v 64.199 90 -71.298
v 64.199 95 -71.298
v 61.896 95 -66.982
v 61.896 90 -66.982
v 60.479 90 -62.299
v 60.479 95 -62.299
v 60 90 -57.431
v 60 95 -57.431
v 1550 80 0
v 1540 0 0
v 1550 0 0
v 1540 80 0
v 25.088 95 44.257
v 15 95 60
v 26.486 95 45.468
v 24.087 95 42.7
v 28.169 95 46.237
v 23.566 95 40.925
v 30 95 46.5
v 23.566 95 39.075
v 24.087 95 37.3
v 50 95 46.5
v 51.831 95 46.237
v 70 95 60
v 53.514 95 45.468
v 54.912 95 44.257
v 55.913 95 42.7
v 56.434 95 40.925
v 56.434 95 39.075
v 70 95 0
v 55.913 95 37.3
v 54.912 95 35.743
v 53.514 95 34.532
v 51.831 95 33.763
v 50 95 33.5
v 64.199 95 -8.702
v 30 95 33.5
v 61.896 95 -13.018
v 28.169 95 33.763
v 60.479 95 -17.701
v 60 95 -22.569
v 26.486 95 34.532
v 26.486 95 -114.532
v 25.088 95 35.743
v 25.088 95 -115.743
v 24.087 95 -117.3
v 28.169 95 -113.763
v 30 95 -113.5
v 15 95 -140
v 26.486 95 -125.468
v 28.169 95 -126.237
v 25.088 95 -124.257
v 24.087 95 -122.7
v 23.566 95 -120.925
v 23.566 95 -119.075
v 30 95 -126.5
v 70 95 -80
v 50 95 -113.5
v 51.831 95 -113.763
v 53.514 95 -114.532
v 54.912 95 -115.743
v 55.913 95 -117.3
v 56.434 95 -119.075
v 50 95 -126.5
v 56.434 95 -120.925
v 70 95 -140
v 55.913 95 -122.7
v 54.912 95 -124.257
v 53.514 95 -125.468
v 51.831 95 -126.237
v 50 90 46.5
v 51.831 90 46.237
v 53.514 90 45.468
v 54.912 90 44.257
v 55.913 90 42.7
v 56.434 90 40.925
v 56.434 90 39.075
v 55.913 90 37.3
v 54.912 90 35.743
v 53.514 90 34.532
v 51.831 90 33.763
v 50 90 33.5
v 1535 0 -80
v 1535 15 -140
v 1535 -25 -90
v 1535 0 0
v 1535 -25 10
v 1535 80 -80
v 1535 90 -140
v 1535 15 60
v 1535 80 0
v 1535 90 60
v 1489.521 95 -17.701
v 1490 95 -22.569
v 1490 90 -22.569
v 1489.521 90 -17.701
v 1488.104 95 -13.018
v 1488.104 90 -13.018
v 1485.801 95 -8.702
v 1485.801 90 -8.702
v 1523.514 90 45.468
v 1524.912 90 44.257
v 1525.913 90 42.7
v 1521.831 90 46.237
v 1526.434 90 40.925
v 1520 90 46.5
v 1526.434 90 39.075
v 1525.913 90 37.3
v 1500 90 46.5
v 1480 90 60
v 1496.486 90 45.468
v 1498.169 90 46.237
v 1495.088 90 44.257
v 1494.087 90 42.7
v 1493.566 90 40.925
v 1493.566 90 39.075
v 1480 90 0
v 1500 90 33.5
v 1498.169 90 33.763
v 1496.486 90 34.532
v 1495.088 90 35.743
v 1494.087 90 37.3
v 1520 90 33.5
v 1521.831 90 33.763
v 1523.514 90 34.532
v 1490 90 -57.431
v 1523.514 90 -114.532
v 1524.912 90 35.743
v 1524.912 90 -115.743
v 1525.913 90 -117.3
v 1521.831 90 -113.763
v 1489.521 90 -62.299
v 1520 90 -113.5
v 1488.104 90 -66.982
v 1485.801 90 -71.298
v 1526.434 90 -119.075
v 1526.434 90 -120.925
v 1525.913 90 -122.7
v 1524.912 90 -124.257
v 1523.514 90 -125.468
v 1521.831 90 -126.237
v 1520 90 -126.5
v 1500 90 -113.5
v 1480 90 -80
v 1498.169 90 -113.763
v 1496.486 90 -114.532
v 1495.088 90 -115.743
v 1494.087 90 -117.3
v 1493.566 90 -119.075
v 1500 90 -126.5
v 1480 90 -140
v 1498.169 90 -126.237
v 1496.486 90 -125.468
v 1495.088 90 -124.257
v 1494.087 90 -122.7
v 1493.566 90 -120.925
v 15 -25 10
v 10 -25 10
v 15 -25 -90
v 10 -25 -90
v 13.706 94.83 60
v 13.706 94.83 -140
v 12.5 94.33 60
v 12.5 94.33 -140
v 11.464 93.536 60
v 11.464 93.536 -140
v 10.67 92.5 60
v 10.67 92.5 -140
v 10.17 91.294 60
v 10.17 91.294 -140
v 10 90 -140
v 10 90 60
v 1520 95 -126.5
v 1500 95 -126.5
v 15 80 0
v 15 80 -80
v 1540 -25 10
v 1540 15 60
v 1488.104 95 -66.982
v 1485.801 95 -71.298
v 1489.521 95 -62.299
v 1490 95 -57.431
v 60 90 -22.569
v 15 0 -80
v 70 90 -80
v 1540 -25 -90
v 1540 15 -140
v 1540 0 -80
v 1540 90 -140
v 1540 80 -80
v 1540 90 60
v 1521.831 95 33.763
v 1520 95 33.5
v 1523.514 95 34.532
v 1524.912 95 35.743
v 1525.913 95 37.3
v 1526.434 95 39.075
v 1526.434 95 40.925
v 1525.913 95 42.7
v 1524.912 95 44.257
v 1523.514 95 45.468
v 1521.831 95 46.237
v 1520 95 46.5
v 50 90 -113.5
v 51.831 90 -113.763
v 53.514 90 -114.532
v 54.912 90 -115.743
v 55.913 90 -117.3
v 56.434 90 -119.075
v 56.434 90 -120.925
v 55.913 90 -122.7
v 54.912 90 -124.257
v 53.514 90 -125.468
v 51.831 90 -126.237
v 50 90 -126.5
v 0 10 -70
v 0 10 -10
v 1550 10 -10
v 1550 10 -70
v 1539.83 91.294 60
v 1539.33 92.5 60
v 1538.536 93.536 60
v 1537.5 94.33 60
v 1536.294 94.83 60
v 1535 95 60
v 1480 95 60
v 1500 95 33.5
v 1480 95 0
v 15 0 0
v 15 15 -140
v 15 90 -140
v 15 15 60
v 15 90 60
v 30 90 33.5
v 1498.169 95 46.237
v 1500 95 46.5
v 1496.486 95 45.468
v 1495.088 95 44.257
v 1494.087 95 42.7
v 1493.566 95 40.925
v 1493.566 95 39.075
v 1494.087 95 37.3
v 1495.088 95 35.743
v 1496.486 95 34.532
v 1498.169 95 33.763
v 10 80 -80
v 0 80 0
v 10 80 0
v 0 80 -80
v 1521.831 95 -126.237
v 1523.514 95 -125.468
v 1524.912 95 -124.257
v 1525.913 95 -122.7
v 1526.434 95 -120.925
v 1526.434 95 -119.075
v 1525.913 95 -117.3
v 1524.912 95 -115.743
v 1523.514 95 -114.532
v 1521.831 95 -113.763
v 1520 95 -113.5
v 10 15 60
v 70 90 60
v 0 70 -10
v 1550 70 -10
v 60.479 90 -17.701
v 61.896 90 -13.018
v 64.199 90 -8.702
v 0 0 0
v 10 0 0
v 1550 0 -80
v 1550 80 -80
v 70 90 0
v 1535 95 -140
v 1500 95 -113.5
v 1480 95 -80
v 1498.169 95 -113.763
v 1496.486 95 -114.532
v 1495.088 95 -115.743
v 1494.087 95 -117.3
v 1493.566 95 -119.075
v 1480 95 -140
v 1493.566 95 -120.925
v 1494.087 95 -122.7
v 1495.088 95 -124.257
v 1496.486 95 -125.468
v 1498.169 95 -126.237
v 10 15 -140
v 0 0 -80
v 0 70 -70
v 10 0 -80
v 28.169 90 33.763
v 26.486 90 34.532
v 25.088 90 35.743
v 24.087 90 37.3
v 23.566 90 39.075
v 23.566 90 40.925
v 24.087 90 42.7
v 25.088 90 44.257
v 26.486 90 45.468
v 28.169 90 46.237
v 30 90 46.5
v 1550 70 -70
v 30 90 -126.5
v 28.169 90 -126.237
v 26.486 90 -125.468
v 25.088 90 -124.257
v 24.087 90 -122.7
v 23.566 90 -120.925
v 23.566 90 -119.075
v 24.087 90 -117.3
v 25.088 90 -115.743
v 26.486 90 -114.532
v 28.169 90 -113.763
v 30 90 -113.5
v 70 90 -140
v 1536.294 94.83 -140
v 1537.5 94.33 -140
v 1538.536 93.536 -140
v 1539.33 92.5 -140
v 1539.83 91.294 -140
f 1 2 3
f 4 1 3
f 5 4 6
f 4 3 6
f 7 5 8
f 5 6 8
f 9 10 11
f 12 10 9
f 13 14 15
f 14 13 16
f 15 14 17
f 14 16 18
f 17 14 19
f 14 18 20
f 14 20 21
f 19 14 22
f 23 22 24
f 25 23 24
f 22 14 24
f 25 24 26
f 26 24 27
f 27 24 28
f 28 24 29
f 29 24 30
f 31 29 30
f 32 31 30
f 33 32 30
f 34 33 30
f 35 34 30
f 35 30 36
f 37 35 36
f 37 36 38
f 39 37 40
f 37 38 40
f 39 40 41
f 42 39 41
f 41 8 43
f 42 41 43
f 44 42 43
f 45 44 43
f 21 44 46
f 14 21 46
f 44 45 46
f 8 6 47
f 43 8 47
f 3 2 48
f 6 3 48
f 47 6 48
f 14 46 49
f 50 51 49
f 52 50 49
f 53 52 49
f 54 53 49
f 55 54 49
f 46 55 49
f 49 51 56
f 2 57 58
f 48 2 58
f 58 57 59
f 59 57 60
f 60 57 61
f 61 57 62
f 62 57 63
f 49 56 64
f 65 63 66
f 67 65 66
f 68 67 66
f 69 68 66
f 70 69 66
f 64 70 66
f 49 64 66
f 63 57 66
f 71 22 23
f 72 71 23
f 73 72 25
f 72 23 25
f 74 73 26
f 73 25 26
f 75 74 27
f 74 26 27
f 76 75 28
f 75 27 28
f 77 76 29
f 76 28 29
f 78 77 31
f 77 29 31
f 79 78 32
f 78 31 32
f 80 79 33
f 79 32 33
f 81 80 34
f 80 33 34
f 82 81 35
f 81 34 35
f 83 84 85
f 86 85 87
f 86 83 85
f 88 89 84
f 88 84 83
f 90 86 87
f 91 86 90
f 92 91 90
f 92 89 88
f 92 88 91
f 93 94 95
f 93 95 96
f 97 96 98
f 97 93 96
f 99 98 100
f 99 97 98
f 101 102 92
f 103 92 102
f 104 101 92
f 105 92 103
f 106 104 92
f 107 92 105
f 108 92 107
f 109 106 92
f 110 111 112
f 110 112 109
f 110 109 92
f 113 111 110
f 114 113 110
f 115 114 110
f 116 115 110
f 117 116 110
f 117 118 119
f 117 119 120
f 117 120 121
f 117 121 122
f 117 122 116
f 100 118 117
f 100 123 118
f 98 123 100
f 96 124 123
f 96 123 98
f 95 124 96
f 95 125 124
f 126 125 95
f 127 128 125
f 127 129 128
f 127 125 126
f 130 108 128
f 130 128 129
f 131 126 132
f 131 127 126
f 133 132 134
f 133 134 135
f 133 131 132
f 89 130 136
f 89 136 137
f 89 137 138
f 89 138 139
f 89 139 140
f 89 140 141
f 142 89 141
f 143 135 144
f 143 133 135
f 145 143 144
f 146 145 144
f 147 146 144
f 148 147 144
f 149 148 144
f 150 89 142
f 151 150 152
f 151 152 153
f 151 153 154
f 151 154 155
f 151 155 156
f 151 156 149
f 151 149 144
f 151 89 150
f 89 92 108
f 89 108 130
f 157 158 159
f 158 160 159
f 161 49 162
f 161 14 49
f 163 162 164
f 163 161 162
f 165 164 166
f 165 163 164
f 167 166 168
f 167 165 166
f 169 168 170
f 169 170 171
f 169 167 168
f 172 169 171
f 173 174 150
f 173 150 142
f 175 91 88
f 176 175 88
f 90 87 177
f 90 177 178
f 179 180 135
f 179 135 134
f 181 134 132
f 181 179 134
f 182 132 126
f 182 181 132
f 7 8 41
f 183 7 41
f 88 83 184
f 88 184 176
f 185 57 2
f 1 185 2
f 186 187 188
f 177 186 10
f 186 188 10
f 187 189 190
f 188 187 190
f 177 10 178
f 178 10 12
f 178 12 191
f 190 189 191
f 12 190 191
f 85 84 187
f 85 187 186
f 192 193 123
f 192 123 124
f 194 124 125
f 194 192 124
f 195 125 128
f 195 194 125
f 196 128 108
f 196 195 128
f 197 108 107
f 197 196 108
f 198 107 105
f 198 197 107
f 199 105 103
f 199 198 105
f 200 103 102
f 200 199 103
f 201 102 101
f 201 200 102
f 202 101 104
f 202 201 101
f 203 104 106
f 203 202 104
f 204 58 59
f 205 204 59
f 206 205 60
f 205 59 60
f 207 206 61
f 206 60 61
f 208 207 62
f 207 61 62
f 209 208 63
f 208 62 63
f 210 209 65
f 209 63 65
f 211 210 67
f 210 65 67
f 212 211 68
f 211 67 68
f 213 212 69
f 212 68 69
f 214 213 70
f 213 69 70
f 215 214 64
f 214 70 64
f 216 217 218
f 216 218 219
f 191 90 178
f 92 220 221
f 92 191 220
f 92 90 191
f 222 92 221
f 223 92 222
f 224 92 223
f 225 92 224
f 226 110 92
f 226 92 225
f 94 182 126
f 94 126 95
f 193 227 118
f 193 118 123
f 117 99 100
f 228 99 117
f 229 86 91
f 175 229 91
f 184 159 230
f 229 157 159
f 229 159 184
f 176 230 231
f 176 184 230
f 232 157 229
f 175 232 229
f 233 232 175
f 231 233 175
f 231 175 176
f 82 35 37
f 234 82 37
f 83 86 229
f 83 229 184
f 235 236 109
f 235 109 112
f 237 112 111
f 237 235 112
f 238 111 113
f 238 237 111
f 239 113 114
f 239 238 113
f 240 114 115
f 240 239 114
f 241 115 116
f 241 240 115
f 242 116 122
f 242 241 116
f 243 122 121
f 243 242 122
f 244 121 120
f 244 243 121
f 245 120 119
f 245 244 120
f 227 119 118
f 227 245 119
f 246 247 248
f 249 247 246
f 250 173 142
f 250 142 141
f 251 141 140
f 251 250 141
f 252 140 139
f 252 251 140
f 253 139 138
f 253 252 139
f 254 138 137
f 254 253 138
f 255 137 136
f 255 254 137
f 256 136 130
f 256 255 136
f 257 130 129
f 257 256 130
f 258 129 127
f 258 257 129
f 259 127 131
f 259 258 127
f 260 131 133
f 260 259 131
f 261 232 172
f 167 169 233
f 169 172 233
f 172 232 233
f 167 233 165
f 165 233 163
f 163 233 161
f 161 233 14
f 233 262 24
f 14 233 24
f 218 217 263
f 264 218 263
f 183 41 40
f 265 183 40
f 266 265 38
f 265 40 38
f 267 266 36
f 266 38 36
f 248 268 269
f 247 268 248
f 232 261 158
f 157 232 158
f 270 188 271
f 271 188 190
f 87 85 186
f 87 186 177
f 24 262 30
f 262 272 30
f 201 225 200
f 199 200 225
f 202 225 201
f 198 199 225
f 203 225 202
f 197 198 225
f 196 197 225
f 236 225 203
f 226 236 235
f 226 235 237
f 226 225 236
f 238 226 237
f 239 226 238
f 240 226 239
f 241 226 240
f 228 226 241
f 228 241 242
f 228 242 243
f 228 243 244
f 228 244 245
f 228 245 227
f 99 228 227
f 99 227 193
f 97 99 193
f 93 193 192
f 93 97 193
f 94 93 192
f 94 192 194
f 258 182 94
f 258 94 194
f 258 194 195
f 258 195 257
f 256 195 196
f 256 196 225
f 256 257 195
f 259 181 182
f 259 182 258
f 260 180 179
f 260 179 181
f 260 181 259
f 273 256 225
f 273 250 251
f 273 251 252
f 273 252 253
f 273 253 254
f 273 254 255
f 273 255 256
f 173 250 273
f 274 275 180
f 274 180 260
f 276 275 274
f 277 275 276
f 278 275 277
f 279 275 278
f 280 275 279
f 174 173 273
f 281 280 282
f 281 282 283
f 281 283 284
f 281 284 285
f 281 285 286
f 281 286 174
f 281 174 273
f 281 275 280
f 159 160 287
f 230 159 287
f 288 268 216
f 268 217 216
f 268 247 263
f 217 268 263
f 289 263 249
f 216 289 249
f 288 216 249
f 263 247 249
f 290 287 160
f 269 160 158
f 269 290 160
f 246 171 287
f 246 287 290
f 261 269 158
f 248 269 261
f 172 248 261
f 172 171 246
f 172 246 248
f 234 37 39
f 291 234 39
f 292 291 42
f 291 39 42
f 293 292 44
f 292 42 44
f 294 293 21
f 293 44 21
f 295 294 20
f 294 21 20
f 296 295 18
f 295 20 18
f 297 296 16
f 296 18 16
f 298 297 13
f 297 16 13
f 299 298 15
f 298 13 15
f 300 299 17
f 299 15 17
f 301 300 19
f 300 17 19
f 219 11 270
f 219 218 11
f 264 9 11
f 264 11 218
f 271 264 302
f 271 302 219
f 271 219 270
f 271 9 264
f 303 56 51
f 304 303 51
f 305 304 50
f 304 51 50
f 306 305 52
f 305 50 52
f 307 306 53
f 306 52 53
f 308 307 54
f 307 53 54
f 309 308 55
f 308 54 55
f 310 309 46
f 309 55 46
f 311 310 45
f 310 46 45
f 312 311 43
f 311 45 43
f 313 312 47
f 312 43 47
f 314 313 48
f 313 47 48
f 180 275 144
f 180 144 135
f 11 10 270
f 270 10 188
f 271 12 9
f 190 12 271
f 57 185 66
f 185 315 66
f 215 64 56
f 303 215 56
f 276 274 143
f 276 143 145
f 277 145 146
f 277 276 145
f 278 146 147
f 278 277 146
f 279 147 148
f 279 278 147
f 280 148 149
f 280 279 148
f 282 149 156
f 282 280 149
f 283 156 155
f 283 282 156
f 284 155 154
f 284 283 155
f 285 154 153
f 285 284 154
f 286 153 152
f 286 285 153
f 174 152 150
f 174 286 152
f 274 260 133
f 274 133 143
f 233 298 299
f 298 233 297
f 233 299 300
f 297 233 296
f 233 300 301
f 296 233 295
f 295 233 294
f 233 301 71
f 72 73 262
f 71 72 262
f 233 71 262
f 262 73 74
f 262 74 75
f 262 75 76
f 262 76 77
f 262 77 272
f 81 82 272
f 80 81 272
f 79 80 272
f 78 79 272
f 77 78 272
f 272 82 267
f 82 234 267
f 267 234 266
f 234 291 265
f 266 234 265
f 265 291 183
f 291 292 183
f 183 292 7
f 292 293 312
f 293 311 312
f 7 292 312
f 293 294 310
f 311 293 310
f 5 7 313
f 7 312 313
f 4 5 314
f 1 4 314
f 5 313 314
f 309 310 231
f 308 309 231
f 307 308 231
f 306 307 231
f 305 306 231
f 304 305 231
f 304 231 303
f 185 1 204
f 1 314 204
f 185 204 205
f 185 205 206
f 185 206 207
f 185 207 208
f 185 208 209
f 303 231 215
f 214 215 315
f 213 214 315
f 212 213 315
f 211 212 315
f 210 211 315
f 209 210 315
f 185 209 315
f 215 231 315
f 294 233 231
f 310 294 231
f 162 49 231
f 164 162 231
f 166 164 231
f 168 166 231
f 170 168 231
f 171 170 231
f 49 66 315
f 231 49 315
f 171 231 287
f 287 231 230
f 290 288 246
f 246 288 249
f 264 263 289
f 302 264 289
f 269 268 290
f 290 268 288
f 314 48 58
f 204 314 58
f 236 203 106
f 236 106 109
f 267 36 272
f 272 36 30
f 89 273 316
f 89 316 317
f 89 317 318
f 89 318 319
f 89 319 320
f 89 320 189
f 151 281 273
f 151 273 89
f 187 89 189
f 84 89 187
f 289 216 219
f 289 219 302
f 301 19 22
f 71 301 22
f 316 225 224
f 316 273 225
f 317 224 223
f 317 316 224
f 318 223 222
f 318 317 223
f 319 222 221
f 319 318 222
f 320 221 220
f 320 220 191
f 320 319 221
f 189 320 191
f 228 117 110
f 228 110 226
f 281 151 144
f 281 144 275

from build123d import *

# Parameters (mm, degrees)
SKETCH3_W                       = 80
SKETCH3_H                       = 80
SKETCH3_W_2                     = 60
SKETCH3_H_2                     = 60
BOSS_EXTRUDE2_DEPTH             = 1550
SKETCH7_W                       = 60
SKETCH7_H                       = 60
BOSS_EXTRUDE3_DEPTH             = 5
BOSS_EXTRUDE4_REACH             = 1561.207
SKETCH8_W                       = 60
SKETCH8_H                       = 5
BOSS_EXTRUDE4_DIRECTION_2_REACH = 1561.207
CUT_EXTRUDE1_REACH              = 1562.929
CUT_EXTRUDE2_REACH              = 1562.929
FILLET1_R                       = 5
MIRROR1_START                   = -90
MIRROR1_DEPTH                   = 10
MIRROR1_2_DEPTH                 = 10
MIRROR1_START_2                 = -80
MIRROR1_3_OUTLINE_W             = 5
MIRROR1_3_OUTLINE_H             = 25
MIRROR1_3_DEPTH                 = 80
MIRROR1_START_3                 = 10
MIRROR1_4_DEPTH                 = 31.124
MIRROR1_START_4                 = -119.452
MIRROR1_5_DEPTH                 = 29.452
MIRROR1_START_5                 = -140
MIRROR1_6_DEPTH                 = 200
MIRROR1_7_DEPTH                 = 5
FILLET1_OF_MIRROR2_R            = 5


with BuildPart() as part:
    # Sketch3 → Boss-Extrude2 (new body)
    with BuildSketch(Plane(origin=(0, 0, 0), x_dir=(0, 0, -1), z_dir=(1, 0, 0))):
        with Locations((40, 40)):
            Rectangle(SKETCH3_W, SKETCH3_H)
        with Locations((40, 40)):
            Rectangle(SKETCH3_W_2, SKETCH3_H_2, mode=Mode.SUBTRACT)
    extrude(amount=BOSS_EXTRUDE2_DEPTH)

    # Sketch7 → Boss-Extrude3 (add)
    with BuildSketch(Plane(origin=(1535, 0, 0), x_dir=(0, 0, -1), z_dir=(1, 0, 0))):
        Polygon((-60, 95), (140, 95), (140, 15), (90, -25), (-10, -25), (-60, 15), align=None)
        with Locations((40, 40)):
            Rectangle(SKETCH7_W, SKETCH7_H, mode=Mode.SUBTRACT)
    boss_extrude3 = extrude(amount=BOSS_EXTRUDE3_DEPTH)

    # Boss-Extrude4: up to this face of the body (flat: up to its plane)
    boss_extrude4_end = Plane(part.part.faces().sort_by_distance((1537.5, 55, -140))[0])
    # Sketch8 → Boss-Extrude4 (add, up to the picked face)
    with BuildSketch(Plane(origin=(0, 0, -80), x_dir=(-1, 0, 0), z_dir=(0, 0, -1)), mode=Mode.PRIVATE) as boss_extrude4_sk1:
        with Locations((-1510, 92.5)):
            Rectangle(SKETCH8_W, SKETCH8_H)
    boss_extrude4_tool1 = split(extrude(boss_extrude4_sk1.sketch, amount=BOSS_EXTRUDE4_REACH, mode=Mode.PRIVATE), bisect_by=boss_extrude4_end, keep=Keep.BOTH, mode=Mode.PRIVATE)
    boss_extrude4 = boss_extrude4_tool1.solids().sort_by(Axis((1510, 92.5, -80), (0, 0, -1)))[0]
    add(boss_extrude4)

    # Boss-Extrude4 direction 2: up to this face of the body (flat: up to its plane)
    boss_extrude4_direction_2_end = Plane(part.part.faces().sort_by_distance((1537.5, 55, 60))[0])
    # Sketch8 → Boss-Extrude4 direction 2 (add, up to the picked face)
    with BuildSketch(Plane(origin=(0, 0, -80), x_dir=(-1, 0, 0), z_dir=(0, 0, -1)), mode=Mode.PRIVATE) as boss_extrude4_direction_2_sk1:
        with Locations((-1510, 92.5)):
            Rectangle(SKETCH8_W, SKETCH8_H)
    boss_extrude4_direction_2_tool1 = split(extrude(boss_extrude4_direction_2_sk1.sketch, amount=-BOSS_EXTRUDE4_DIRECTION_2_REACH, mode=Mode.PRIVATE), bisect_by=boss_extrude4_direction_2_end, keep=Keep.BOTH, mode=Mode.PRIVATE)
    boss_extrude4_direction_2 = boss_extrude4_direction_2_tool1.solids().sort_by(Axis((1510, 92.5, -80), (0, 0, 1)))[0]
    add(boss_extrude4_direction_2)

    # Sketch9 → Cut-Extrude1 (cut, up to next)
    with BuildSketch(Plane(origin=(0, 95, 0), x_dir=(1, 0, 0), z_dir=(0, 1, 0)), mode=Mode.PRIVATE) as cut_extrude1_sk1:
        with BuildLine():
            Line((1480, 80), (1485.801257358, 71.298113962))
            ThreePointArc((1485.801257358, 71.298113962), (1488.927300662, 64.675212774), (1490, 57.430609057))
            Line((1490, 57.430609057), (1490, 22.569390943))
            ThreePointArc((1490, 22.569390943), (1488.927300662, 15.324787226), (1485.801257358, 8.701886038))
            Line((1485.801257358, 8.701886038), (1480, 0))
            Line((1480, 0), (1480, 80))
        make_face()
    cut_extrude1_tool1 = extrude(cut_extrude1_sk1.sketch, amount=-CUT_EXTRUDE1_REACH, mode=Mode.PRIVATE) & part.part
    cut_extrude1 = cut_extrude1_tool1.solids().sort_by_distance((1484.537596, 95, -40))[0]
    add(cut_extrude1, mode=Mode.SUBTRACT)

    # Sketch10 → Cut-Extrude2 (cut, up to next)
    with BuildSketch(Plane(origin=(0, 95, 0), x_dir=(1, 0, 0), z_dir=(0, 1, 0)), mode=Mode.PRIVATE) as cut_extrude2_sk1:
        with BuildLine():
            Line((1500, 126.5), (1520, 126.5))
            ThreePointArc((1520, 126.5), (1526.5, 120), (1520, 113.5))
            Line((1520, 113.5), (1500, 113.5))
            ThreePointArc((1500, 113.5), (1493.5, 120), (1500, 126.5))
        make_face()
    cut_extrude2_tool1 = extrude(cut_extrude2_sk1.sketch, amount=-CUT_EXTRUDE2_REACH, mode=Mode.PRIVATE) & part.part
    # Sketch10 → Cut-Extrude2 (cut, up to next)
    with BuildSketch(Plane(origin=(0, 95, 0), x_dir=(1, 0, 0), z_dir=(0, 1, 0)), mode=Mode.PRIVATE) as cut_extrude2_sk2:
        with BuildLine():
            Line((1500, -33.5), (1520, -33.5))
            ThreePointArc((1520, -33.5), (1526.5, -40), (1520, -46.5))
            Line((1520, -46.5), (1500, -46.5))
            ThreePointArc((1500, -46.5), (1493.5, -40), (1500, -33.5))
        make_face()
    cut_extrude2_tool2 = extrude(cut_extrude2_sk2.sketch, amount=-CUT_EXTRUDE2_REACH, mode=Mode.PRIVATE) & part.part
    cut_extrude2_1 = cut_extrude2_tool1.solids().sort_by_distance((1510, 95, -120))[0]
    add(cut_extrude2_1, mode=Mode.SUBTRACT)
    cut_extrude2_2 = cut_extrude2_tool2.solids().sort_by_distance((1510, 95, 40))[0]
    add(cut_extrude2_2, mode=Mode.SUBTRACT)
    cut_extrude2 = cut_extrude2_1 + cut_extrude2_2  # Cut-Extrude2 as one shape, for the pattern or mirror that repeats it

    # Fillet1
    fillet1_edges = [part.edges().sort_by_distance(p)[0] for p in [
        (1540, 95, -40),
    ]]
    fillet(fillet1_edges, radius=FILLET1_R)

    # Mirror1: read off the stored shape, not the designer's step
    # Mirror1 outline → Mirror1 (add)
    with BuildSketch(Plane.XY.offset(MIRROR1_START)):
        with BuildLine():
            Line((10, 90), (10, -25))
            Line((10, -25), (15, -25))
            Line((15, -25), (15, 95))
            ThreePointArc((15, 95), (11.464466094, 93.535533906), (10, 90))
        make_face()
    extrude(amount=MIRROR1_DEPTH)

    # Mirror1 2 outline → Mirror1 2 (add)
    with BuildSketch(Plane.XY):
        with BuildLine():
            Line((10, 90), (10, -25))
            Line((10, -25), (15, -25))
            Line((15, -25), (15, 95))
            ThreePointArc((15, 95), (11.464466094, 93.535533906), (10, 90))
        make_face()
    extrude(amount=MIRROR1_2_DEPTH)

    # Mirror1 3 outline → Mirror1 3 (add)
    with BuildSketch(Plane.XY.offset(MIRROR1_START_2)):
        with Locations((12.5, -12.5)):
            Rectangle(MIRROR1_3_OUTLINE_W, MIRROR1_3_OUTLINE_H)
        with BuildLine():
            Line((10, 90), (10, 80))
            Line((10, 80), (15, 80))
            Line((15, 80), (15, 95))
            ThreePointArc((15, 95), (11.464466094, 93.535533906), (10, 90))
        make_face()
    extrude(amount=MIRROR1_3_DEPTH)

    # Mirror1 4 outline → Mirror1 4 (add)
    with BuildSketch(Plane.XY.offset(MIRROR1_START_3)):
        with BuildLine():
            Line((10, 0), (15, 0))
            Line((15, 0), (15, 95))
            ThreePointArc((15, 95), (11.464466094, 93.535533906), (10, 90))
            Line((10, 90), (10, 0))
        make_face()
    extrude(amount=MIRROR1_4_DEPTH)

    # Mirror1 5 outline → Mirror1 5 (add)
    with BuildSketch(Plane.XY.offset(MIRROR1_START_4)):
        with BuildLine():
            Line((10, 0), (15, 0))
            Line((15, 0), (15, 95))
            ThreePointArc((15, 95), (11.464466094, 93.535533906), (10, 90))
            Line((10, 90), (10, 0))
        make_face()
    extrude(amount=MIRROR1_5_DEPTH)

    # Mirror1 6 outline → Mirror1 6 (add)
    with BuildSketch(Plane.XY.offset(MIRROR1_START_5)):
        with BuildLine():
            Line((10, 90), (10, 80))
            Line((10, 80), (15, 80))
            Line((15, 80), (15, 95))
            ThreePointArc((15, 95), (11.464466094, 93.535533906), (10, 90))
        make_face()
    extrude(amount=MIRROR1_6_DEPTH)

    # Mirror1 7 outline → Mirror1 7 (add)
    with BuildSketch(Plane.YZ.offset(MIRROR1_START_3)):
        Polygon((80, 41.124), (80, 60), (15, 60), (-25, 10), (0, 10), (0, 41.124), align=None)
        Polygon((0, -90), (-25, -90), (15, -140), (80, -140), (80, -119.452), (0, -119.452), align=None)
    extrude(amount=MIRROR1_7_DEPTH)

    # Mirror2: Boss-Extrude3, Boss-Extrude4, Boss-Extrude4 direction 2, Cut-Extrude1, Cut-Extrude2 across plane
    add(boss_extrude3.mirror(Plane(origin=(775, 0, 0), x_dir=(0, 0, 1), z_dir=(1, 0, 0))))
    add(boss_extrude4.mirror(Plane(origin=(775, 0, 0), x_dir=(0, 0, 1), z_dir=(1, 0, 0))))
    add(boss_extrude4_direction_2.mirror(Plane(origin=(775, 0, 0), x_dir=(0, 0, 1), z_dir=(1, 0, 0))))
    add(cut_extrude1.mirror(Plane(origin=(775, 0, 0), x_dir=(0, 0, 1), z_dir=(1, 0, 0))), mode=Mode.SUBTRACT)
    add(cut_extrude2.mirror(Plane(origin=(775, 0, 0), x_dir=(0, 0, 1), z_dir=(1, 0, 0))), mode=Mode.SUBTRACT)

    # Fillet1 of Mirror2
    fillet1_of_mirror2_edges = [part.edges().sort_by_distance(p)[0] for p in [
        (10, 95, -40),
    ]]
    fillet(fillet1_of_mirror2_edges, radius=FILLET1_OF_MIRROR2_R)


solid = part.part
